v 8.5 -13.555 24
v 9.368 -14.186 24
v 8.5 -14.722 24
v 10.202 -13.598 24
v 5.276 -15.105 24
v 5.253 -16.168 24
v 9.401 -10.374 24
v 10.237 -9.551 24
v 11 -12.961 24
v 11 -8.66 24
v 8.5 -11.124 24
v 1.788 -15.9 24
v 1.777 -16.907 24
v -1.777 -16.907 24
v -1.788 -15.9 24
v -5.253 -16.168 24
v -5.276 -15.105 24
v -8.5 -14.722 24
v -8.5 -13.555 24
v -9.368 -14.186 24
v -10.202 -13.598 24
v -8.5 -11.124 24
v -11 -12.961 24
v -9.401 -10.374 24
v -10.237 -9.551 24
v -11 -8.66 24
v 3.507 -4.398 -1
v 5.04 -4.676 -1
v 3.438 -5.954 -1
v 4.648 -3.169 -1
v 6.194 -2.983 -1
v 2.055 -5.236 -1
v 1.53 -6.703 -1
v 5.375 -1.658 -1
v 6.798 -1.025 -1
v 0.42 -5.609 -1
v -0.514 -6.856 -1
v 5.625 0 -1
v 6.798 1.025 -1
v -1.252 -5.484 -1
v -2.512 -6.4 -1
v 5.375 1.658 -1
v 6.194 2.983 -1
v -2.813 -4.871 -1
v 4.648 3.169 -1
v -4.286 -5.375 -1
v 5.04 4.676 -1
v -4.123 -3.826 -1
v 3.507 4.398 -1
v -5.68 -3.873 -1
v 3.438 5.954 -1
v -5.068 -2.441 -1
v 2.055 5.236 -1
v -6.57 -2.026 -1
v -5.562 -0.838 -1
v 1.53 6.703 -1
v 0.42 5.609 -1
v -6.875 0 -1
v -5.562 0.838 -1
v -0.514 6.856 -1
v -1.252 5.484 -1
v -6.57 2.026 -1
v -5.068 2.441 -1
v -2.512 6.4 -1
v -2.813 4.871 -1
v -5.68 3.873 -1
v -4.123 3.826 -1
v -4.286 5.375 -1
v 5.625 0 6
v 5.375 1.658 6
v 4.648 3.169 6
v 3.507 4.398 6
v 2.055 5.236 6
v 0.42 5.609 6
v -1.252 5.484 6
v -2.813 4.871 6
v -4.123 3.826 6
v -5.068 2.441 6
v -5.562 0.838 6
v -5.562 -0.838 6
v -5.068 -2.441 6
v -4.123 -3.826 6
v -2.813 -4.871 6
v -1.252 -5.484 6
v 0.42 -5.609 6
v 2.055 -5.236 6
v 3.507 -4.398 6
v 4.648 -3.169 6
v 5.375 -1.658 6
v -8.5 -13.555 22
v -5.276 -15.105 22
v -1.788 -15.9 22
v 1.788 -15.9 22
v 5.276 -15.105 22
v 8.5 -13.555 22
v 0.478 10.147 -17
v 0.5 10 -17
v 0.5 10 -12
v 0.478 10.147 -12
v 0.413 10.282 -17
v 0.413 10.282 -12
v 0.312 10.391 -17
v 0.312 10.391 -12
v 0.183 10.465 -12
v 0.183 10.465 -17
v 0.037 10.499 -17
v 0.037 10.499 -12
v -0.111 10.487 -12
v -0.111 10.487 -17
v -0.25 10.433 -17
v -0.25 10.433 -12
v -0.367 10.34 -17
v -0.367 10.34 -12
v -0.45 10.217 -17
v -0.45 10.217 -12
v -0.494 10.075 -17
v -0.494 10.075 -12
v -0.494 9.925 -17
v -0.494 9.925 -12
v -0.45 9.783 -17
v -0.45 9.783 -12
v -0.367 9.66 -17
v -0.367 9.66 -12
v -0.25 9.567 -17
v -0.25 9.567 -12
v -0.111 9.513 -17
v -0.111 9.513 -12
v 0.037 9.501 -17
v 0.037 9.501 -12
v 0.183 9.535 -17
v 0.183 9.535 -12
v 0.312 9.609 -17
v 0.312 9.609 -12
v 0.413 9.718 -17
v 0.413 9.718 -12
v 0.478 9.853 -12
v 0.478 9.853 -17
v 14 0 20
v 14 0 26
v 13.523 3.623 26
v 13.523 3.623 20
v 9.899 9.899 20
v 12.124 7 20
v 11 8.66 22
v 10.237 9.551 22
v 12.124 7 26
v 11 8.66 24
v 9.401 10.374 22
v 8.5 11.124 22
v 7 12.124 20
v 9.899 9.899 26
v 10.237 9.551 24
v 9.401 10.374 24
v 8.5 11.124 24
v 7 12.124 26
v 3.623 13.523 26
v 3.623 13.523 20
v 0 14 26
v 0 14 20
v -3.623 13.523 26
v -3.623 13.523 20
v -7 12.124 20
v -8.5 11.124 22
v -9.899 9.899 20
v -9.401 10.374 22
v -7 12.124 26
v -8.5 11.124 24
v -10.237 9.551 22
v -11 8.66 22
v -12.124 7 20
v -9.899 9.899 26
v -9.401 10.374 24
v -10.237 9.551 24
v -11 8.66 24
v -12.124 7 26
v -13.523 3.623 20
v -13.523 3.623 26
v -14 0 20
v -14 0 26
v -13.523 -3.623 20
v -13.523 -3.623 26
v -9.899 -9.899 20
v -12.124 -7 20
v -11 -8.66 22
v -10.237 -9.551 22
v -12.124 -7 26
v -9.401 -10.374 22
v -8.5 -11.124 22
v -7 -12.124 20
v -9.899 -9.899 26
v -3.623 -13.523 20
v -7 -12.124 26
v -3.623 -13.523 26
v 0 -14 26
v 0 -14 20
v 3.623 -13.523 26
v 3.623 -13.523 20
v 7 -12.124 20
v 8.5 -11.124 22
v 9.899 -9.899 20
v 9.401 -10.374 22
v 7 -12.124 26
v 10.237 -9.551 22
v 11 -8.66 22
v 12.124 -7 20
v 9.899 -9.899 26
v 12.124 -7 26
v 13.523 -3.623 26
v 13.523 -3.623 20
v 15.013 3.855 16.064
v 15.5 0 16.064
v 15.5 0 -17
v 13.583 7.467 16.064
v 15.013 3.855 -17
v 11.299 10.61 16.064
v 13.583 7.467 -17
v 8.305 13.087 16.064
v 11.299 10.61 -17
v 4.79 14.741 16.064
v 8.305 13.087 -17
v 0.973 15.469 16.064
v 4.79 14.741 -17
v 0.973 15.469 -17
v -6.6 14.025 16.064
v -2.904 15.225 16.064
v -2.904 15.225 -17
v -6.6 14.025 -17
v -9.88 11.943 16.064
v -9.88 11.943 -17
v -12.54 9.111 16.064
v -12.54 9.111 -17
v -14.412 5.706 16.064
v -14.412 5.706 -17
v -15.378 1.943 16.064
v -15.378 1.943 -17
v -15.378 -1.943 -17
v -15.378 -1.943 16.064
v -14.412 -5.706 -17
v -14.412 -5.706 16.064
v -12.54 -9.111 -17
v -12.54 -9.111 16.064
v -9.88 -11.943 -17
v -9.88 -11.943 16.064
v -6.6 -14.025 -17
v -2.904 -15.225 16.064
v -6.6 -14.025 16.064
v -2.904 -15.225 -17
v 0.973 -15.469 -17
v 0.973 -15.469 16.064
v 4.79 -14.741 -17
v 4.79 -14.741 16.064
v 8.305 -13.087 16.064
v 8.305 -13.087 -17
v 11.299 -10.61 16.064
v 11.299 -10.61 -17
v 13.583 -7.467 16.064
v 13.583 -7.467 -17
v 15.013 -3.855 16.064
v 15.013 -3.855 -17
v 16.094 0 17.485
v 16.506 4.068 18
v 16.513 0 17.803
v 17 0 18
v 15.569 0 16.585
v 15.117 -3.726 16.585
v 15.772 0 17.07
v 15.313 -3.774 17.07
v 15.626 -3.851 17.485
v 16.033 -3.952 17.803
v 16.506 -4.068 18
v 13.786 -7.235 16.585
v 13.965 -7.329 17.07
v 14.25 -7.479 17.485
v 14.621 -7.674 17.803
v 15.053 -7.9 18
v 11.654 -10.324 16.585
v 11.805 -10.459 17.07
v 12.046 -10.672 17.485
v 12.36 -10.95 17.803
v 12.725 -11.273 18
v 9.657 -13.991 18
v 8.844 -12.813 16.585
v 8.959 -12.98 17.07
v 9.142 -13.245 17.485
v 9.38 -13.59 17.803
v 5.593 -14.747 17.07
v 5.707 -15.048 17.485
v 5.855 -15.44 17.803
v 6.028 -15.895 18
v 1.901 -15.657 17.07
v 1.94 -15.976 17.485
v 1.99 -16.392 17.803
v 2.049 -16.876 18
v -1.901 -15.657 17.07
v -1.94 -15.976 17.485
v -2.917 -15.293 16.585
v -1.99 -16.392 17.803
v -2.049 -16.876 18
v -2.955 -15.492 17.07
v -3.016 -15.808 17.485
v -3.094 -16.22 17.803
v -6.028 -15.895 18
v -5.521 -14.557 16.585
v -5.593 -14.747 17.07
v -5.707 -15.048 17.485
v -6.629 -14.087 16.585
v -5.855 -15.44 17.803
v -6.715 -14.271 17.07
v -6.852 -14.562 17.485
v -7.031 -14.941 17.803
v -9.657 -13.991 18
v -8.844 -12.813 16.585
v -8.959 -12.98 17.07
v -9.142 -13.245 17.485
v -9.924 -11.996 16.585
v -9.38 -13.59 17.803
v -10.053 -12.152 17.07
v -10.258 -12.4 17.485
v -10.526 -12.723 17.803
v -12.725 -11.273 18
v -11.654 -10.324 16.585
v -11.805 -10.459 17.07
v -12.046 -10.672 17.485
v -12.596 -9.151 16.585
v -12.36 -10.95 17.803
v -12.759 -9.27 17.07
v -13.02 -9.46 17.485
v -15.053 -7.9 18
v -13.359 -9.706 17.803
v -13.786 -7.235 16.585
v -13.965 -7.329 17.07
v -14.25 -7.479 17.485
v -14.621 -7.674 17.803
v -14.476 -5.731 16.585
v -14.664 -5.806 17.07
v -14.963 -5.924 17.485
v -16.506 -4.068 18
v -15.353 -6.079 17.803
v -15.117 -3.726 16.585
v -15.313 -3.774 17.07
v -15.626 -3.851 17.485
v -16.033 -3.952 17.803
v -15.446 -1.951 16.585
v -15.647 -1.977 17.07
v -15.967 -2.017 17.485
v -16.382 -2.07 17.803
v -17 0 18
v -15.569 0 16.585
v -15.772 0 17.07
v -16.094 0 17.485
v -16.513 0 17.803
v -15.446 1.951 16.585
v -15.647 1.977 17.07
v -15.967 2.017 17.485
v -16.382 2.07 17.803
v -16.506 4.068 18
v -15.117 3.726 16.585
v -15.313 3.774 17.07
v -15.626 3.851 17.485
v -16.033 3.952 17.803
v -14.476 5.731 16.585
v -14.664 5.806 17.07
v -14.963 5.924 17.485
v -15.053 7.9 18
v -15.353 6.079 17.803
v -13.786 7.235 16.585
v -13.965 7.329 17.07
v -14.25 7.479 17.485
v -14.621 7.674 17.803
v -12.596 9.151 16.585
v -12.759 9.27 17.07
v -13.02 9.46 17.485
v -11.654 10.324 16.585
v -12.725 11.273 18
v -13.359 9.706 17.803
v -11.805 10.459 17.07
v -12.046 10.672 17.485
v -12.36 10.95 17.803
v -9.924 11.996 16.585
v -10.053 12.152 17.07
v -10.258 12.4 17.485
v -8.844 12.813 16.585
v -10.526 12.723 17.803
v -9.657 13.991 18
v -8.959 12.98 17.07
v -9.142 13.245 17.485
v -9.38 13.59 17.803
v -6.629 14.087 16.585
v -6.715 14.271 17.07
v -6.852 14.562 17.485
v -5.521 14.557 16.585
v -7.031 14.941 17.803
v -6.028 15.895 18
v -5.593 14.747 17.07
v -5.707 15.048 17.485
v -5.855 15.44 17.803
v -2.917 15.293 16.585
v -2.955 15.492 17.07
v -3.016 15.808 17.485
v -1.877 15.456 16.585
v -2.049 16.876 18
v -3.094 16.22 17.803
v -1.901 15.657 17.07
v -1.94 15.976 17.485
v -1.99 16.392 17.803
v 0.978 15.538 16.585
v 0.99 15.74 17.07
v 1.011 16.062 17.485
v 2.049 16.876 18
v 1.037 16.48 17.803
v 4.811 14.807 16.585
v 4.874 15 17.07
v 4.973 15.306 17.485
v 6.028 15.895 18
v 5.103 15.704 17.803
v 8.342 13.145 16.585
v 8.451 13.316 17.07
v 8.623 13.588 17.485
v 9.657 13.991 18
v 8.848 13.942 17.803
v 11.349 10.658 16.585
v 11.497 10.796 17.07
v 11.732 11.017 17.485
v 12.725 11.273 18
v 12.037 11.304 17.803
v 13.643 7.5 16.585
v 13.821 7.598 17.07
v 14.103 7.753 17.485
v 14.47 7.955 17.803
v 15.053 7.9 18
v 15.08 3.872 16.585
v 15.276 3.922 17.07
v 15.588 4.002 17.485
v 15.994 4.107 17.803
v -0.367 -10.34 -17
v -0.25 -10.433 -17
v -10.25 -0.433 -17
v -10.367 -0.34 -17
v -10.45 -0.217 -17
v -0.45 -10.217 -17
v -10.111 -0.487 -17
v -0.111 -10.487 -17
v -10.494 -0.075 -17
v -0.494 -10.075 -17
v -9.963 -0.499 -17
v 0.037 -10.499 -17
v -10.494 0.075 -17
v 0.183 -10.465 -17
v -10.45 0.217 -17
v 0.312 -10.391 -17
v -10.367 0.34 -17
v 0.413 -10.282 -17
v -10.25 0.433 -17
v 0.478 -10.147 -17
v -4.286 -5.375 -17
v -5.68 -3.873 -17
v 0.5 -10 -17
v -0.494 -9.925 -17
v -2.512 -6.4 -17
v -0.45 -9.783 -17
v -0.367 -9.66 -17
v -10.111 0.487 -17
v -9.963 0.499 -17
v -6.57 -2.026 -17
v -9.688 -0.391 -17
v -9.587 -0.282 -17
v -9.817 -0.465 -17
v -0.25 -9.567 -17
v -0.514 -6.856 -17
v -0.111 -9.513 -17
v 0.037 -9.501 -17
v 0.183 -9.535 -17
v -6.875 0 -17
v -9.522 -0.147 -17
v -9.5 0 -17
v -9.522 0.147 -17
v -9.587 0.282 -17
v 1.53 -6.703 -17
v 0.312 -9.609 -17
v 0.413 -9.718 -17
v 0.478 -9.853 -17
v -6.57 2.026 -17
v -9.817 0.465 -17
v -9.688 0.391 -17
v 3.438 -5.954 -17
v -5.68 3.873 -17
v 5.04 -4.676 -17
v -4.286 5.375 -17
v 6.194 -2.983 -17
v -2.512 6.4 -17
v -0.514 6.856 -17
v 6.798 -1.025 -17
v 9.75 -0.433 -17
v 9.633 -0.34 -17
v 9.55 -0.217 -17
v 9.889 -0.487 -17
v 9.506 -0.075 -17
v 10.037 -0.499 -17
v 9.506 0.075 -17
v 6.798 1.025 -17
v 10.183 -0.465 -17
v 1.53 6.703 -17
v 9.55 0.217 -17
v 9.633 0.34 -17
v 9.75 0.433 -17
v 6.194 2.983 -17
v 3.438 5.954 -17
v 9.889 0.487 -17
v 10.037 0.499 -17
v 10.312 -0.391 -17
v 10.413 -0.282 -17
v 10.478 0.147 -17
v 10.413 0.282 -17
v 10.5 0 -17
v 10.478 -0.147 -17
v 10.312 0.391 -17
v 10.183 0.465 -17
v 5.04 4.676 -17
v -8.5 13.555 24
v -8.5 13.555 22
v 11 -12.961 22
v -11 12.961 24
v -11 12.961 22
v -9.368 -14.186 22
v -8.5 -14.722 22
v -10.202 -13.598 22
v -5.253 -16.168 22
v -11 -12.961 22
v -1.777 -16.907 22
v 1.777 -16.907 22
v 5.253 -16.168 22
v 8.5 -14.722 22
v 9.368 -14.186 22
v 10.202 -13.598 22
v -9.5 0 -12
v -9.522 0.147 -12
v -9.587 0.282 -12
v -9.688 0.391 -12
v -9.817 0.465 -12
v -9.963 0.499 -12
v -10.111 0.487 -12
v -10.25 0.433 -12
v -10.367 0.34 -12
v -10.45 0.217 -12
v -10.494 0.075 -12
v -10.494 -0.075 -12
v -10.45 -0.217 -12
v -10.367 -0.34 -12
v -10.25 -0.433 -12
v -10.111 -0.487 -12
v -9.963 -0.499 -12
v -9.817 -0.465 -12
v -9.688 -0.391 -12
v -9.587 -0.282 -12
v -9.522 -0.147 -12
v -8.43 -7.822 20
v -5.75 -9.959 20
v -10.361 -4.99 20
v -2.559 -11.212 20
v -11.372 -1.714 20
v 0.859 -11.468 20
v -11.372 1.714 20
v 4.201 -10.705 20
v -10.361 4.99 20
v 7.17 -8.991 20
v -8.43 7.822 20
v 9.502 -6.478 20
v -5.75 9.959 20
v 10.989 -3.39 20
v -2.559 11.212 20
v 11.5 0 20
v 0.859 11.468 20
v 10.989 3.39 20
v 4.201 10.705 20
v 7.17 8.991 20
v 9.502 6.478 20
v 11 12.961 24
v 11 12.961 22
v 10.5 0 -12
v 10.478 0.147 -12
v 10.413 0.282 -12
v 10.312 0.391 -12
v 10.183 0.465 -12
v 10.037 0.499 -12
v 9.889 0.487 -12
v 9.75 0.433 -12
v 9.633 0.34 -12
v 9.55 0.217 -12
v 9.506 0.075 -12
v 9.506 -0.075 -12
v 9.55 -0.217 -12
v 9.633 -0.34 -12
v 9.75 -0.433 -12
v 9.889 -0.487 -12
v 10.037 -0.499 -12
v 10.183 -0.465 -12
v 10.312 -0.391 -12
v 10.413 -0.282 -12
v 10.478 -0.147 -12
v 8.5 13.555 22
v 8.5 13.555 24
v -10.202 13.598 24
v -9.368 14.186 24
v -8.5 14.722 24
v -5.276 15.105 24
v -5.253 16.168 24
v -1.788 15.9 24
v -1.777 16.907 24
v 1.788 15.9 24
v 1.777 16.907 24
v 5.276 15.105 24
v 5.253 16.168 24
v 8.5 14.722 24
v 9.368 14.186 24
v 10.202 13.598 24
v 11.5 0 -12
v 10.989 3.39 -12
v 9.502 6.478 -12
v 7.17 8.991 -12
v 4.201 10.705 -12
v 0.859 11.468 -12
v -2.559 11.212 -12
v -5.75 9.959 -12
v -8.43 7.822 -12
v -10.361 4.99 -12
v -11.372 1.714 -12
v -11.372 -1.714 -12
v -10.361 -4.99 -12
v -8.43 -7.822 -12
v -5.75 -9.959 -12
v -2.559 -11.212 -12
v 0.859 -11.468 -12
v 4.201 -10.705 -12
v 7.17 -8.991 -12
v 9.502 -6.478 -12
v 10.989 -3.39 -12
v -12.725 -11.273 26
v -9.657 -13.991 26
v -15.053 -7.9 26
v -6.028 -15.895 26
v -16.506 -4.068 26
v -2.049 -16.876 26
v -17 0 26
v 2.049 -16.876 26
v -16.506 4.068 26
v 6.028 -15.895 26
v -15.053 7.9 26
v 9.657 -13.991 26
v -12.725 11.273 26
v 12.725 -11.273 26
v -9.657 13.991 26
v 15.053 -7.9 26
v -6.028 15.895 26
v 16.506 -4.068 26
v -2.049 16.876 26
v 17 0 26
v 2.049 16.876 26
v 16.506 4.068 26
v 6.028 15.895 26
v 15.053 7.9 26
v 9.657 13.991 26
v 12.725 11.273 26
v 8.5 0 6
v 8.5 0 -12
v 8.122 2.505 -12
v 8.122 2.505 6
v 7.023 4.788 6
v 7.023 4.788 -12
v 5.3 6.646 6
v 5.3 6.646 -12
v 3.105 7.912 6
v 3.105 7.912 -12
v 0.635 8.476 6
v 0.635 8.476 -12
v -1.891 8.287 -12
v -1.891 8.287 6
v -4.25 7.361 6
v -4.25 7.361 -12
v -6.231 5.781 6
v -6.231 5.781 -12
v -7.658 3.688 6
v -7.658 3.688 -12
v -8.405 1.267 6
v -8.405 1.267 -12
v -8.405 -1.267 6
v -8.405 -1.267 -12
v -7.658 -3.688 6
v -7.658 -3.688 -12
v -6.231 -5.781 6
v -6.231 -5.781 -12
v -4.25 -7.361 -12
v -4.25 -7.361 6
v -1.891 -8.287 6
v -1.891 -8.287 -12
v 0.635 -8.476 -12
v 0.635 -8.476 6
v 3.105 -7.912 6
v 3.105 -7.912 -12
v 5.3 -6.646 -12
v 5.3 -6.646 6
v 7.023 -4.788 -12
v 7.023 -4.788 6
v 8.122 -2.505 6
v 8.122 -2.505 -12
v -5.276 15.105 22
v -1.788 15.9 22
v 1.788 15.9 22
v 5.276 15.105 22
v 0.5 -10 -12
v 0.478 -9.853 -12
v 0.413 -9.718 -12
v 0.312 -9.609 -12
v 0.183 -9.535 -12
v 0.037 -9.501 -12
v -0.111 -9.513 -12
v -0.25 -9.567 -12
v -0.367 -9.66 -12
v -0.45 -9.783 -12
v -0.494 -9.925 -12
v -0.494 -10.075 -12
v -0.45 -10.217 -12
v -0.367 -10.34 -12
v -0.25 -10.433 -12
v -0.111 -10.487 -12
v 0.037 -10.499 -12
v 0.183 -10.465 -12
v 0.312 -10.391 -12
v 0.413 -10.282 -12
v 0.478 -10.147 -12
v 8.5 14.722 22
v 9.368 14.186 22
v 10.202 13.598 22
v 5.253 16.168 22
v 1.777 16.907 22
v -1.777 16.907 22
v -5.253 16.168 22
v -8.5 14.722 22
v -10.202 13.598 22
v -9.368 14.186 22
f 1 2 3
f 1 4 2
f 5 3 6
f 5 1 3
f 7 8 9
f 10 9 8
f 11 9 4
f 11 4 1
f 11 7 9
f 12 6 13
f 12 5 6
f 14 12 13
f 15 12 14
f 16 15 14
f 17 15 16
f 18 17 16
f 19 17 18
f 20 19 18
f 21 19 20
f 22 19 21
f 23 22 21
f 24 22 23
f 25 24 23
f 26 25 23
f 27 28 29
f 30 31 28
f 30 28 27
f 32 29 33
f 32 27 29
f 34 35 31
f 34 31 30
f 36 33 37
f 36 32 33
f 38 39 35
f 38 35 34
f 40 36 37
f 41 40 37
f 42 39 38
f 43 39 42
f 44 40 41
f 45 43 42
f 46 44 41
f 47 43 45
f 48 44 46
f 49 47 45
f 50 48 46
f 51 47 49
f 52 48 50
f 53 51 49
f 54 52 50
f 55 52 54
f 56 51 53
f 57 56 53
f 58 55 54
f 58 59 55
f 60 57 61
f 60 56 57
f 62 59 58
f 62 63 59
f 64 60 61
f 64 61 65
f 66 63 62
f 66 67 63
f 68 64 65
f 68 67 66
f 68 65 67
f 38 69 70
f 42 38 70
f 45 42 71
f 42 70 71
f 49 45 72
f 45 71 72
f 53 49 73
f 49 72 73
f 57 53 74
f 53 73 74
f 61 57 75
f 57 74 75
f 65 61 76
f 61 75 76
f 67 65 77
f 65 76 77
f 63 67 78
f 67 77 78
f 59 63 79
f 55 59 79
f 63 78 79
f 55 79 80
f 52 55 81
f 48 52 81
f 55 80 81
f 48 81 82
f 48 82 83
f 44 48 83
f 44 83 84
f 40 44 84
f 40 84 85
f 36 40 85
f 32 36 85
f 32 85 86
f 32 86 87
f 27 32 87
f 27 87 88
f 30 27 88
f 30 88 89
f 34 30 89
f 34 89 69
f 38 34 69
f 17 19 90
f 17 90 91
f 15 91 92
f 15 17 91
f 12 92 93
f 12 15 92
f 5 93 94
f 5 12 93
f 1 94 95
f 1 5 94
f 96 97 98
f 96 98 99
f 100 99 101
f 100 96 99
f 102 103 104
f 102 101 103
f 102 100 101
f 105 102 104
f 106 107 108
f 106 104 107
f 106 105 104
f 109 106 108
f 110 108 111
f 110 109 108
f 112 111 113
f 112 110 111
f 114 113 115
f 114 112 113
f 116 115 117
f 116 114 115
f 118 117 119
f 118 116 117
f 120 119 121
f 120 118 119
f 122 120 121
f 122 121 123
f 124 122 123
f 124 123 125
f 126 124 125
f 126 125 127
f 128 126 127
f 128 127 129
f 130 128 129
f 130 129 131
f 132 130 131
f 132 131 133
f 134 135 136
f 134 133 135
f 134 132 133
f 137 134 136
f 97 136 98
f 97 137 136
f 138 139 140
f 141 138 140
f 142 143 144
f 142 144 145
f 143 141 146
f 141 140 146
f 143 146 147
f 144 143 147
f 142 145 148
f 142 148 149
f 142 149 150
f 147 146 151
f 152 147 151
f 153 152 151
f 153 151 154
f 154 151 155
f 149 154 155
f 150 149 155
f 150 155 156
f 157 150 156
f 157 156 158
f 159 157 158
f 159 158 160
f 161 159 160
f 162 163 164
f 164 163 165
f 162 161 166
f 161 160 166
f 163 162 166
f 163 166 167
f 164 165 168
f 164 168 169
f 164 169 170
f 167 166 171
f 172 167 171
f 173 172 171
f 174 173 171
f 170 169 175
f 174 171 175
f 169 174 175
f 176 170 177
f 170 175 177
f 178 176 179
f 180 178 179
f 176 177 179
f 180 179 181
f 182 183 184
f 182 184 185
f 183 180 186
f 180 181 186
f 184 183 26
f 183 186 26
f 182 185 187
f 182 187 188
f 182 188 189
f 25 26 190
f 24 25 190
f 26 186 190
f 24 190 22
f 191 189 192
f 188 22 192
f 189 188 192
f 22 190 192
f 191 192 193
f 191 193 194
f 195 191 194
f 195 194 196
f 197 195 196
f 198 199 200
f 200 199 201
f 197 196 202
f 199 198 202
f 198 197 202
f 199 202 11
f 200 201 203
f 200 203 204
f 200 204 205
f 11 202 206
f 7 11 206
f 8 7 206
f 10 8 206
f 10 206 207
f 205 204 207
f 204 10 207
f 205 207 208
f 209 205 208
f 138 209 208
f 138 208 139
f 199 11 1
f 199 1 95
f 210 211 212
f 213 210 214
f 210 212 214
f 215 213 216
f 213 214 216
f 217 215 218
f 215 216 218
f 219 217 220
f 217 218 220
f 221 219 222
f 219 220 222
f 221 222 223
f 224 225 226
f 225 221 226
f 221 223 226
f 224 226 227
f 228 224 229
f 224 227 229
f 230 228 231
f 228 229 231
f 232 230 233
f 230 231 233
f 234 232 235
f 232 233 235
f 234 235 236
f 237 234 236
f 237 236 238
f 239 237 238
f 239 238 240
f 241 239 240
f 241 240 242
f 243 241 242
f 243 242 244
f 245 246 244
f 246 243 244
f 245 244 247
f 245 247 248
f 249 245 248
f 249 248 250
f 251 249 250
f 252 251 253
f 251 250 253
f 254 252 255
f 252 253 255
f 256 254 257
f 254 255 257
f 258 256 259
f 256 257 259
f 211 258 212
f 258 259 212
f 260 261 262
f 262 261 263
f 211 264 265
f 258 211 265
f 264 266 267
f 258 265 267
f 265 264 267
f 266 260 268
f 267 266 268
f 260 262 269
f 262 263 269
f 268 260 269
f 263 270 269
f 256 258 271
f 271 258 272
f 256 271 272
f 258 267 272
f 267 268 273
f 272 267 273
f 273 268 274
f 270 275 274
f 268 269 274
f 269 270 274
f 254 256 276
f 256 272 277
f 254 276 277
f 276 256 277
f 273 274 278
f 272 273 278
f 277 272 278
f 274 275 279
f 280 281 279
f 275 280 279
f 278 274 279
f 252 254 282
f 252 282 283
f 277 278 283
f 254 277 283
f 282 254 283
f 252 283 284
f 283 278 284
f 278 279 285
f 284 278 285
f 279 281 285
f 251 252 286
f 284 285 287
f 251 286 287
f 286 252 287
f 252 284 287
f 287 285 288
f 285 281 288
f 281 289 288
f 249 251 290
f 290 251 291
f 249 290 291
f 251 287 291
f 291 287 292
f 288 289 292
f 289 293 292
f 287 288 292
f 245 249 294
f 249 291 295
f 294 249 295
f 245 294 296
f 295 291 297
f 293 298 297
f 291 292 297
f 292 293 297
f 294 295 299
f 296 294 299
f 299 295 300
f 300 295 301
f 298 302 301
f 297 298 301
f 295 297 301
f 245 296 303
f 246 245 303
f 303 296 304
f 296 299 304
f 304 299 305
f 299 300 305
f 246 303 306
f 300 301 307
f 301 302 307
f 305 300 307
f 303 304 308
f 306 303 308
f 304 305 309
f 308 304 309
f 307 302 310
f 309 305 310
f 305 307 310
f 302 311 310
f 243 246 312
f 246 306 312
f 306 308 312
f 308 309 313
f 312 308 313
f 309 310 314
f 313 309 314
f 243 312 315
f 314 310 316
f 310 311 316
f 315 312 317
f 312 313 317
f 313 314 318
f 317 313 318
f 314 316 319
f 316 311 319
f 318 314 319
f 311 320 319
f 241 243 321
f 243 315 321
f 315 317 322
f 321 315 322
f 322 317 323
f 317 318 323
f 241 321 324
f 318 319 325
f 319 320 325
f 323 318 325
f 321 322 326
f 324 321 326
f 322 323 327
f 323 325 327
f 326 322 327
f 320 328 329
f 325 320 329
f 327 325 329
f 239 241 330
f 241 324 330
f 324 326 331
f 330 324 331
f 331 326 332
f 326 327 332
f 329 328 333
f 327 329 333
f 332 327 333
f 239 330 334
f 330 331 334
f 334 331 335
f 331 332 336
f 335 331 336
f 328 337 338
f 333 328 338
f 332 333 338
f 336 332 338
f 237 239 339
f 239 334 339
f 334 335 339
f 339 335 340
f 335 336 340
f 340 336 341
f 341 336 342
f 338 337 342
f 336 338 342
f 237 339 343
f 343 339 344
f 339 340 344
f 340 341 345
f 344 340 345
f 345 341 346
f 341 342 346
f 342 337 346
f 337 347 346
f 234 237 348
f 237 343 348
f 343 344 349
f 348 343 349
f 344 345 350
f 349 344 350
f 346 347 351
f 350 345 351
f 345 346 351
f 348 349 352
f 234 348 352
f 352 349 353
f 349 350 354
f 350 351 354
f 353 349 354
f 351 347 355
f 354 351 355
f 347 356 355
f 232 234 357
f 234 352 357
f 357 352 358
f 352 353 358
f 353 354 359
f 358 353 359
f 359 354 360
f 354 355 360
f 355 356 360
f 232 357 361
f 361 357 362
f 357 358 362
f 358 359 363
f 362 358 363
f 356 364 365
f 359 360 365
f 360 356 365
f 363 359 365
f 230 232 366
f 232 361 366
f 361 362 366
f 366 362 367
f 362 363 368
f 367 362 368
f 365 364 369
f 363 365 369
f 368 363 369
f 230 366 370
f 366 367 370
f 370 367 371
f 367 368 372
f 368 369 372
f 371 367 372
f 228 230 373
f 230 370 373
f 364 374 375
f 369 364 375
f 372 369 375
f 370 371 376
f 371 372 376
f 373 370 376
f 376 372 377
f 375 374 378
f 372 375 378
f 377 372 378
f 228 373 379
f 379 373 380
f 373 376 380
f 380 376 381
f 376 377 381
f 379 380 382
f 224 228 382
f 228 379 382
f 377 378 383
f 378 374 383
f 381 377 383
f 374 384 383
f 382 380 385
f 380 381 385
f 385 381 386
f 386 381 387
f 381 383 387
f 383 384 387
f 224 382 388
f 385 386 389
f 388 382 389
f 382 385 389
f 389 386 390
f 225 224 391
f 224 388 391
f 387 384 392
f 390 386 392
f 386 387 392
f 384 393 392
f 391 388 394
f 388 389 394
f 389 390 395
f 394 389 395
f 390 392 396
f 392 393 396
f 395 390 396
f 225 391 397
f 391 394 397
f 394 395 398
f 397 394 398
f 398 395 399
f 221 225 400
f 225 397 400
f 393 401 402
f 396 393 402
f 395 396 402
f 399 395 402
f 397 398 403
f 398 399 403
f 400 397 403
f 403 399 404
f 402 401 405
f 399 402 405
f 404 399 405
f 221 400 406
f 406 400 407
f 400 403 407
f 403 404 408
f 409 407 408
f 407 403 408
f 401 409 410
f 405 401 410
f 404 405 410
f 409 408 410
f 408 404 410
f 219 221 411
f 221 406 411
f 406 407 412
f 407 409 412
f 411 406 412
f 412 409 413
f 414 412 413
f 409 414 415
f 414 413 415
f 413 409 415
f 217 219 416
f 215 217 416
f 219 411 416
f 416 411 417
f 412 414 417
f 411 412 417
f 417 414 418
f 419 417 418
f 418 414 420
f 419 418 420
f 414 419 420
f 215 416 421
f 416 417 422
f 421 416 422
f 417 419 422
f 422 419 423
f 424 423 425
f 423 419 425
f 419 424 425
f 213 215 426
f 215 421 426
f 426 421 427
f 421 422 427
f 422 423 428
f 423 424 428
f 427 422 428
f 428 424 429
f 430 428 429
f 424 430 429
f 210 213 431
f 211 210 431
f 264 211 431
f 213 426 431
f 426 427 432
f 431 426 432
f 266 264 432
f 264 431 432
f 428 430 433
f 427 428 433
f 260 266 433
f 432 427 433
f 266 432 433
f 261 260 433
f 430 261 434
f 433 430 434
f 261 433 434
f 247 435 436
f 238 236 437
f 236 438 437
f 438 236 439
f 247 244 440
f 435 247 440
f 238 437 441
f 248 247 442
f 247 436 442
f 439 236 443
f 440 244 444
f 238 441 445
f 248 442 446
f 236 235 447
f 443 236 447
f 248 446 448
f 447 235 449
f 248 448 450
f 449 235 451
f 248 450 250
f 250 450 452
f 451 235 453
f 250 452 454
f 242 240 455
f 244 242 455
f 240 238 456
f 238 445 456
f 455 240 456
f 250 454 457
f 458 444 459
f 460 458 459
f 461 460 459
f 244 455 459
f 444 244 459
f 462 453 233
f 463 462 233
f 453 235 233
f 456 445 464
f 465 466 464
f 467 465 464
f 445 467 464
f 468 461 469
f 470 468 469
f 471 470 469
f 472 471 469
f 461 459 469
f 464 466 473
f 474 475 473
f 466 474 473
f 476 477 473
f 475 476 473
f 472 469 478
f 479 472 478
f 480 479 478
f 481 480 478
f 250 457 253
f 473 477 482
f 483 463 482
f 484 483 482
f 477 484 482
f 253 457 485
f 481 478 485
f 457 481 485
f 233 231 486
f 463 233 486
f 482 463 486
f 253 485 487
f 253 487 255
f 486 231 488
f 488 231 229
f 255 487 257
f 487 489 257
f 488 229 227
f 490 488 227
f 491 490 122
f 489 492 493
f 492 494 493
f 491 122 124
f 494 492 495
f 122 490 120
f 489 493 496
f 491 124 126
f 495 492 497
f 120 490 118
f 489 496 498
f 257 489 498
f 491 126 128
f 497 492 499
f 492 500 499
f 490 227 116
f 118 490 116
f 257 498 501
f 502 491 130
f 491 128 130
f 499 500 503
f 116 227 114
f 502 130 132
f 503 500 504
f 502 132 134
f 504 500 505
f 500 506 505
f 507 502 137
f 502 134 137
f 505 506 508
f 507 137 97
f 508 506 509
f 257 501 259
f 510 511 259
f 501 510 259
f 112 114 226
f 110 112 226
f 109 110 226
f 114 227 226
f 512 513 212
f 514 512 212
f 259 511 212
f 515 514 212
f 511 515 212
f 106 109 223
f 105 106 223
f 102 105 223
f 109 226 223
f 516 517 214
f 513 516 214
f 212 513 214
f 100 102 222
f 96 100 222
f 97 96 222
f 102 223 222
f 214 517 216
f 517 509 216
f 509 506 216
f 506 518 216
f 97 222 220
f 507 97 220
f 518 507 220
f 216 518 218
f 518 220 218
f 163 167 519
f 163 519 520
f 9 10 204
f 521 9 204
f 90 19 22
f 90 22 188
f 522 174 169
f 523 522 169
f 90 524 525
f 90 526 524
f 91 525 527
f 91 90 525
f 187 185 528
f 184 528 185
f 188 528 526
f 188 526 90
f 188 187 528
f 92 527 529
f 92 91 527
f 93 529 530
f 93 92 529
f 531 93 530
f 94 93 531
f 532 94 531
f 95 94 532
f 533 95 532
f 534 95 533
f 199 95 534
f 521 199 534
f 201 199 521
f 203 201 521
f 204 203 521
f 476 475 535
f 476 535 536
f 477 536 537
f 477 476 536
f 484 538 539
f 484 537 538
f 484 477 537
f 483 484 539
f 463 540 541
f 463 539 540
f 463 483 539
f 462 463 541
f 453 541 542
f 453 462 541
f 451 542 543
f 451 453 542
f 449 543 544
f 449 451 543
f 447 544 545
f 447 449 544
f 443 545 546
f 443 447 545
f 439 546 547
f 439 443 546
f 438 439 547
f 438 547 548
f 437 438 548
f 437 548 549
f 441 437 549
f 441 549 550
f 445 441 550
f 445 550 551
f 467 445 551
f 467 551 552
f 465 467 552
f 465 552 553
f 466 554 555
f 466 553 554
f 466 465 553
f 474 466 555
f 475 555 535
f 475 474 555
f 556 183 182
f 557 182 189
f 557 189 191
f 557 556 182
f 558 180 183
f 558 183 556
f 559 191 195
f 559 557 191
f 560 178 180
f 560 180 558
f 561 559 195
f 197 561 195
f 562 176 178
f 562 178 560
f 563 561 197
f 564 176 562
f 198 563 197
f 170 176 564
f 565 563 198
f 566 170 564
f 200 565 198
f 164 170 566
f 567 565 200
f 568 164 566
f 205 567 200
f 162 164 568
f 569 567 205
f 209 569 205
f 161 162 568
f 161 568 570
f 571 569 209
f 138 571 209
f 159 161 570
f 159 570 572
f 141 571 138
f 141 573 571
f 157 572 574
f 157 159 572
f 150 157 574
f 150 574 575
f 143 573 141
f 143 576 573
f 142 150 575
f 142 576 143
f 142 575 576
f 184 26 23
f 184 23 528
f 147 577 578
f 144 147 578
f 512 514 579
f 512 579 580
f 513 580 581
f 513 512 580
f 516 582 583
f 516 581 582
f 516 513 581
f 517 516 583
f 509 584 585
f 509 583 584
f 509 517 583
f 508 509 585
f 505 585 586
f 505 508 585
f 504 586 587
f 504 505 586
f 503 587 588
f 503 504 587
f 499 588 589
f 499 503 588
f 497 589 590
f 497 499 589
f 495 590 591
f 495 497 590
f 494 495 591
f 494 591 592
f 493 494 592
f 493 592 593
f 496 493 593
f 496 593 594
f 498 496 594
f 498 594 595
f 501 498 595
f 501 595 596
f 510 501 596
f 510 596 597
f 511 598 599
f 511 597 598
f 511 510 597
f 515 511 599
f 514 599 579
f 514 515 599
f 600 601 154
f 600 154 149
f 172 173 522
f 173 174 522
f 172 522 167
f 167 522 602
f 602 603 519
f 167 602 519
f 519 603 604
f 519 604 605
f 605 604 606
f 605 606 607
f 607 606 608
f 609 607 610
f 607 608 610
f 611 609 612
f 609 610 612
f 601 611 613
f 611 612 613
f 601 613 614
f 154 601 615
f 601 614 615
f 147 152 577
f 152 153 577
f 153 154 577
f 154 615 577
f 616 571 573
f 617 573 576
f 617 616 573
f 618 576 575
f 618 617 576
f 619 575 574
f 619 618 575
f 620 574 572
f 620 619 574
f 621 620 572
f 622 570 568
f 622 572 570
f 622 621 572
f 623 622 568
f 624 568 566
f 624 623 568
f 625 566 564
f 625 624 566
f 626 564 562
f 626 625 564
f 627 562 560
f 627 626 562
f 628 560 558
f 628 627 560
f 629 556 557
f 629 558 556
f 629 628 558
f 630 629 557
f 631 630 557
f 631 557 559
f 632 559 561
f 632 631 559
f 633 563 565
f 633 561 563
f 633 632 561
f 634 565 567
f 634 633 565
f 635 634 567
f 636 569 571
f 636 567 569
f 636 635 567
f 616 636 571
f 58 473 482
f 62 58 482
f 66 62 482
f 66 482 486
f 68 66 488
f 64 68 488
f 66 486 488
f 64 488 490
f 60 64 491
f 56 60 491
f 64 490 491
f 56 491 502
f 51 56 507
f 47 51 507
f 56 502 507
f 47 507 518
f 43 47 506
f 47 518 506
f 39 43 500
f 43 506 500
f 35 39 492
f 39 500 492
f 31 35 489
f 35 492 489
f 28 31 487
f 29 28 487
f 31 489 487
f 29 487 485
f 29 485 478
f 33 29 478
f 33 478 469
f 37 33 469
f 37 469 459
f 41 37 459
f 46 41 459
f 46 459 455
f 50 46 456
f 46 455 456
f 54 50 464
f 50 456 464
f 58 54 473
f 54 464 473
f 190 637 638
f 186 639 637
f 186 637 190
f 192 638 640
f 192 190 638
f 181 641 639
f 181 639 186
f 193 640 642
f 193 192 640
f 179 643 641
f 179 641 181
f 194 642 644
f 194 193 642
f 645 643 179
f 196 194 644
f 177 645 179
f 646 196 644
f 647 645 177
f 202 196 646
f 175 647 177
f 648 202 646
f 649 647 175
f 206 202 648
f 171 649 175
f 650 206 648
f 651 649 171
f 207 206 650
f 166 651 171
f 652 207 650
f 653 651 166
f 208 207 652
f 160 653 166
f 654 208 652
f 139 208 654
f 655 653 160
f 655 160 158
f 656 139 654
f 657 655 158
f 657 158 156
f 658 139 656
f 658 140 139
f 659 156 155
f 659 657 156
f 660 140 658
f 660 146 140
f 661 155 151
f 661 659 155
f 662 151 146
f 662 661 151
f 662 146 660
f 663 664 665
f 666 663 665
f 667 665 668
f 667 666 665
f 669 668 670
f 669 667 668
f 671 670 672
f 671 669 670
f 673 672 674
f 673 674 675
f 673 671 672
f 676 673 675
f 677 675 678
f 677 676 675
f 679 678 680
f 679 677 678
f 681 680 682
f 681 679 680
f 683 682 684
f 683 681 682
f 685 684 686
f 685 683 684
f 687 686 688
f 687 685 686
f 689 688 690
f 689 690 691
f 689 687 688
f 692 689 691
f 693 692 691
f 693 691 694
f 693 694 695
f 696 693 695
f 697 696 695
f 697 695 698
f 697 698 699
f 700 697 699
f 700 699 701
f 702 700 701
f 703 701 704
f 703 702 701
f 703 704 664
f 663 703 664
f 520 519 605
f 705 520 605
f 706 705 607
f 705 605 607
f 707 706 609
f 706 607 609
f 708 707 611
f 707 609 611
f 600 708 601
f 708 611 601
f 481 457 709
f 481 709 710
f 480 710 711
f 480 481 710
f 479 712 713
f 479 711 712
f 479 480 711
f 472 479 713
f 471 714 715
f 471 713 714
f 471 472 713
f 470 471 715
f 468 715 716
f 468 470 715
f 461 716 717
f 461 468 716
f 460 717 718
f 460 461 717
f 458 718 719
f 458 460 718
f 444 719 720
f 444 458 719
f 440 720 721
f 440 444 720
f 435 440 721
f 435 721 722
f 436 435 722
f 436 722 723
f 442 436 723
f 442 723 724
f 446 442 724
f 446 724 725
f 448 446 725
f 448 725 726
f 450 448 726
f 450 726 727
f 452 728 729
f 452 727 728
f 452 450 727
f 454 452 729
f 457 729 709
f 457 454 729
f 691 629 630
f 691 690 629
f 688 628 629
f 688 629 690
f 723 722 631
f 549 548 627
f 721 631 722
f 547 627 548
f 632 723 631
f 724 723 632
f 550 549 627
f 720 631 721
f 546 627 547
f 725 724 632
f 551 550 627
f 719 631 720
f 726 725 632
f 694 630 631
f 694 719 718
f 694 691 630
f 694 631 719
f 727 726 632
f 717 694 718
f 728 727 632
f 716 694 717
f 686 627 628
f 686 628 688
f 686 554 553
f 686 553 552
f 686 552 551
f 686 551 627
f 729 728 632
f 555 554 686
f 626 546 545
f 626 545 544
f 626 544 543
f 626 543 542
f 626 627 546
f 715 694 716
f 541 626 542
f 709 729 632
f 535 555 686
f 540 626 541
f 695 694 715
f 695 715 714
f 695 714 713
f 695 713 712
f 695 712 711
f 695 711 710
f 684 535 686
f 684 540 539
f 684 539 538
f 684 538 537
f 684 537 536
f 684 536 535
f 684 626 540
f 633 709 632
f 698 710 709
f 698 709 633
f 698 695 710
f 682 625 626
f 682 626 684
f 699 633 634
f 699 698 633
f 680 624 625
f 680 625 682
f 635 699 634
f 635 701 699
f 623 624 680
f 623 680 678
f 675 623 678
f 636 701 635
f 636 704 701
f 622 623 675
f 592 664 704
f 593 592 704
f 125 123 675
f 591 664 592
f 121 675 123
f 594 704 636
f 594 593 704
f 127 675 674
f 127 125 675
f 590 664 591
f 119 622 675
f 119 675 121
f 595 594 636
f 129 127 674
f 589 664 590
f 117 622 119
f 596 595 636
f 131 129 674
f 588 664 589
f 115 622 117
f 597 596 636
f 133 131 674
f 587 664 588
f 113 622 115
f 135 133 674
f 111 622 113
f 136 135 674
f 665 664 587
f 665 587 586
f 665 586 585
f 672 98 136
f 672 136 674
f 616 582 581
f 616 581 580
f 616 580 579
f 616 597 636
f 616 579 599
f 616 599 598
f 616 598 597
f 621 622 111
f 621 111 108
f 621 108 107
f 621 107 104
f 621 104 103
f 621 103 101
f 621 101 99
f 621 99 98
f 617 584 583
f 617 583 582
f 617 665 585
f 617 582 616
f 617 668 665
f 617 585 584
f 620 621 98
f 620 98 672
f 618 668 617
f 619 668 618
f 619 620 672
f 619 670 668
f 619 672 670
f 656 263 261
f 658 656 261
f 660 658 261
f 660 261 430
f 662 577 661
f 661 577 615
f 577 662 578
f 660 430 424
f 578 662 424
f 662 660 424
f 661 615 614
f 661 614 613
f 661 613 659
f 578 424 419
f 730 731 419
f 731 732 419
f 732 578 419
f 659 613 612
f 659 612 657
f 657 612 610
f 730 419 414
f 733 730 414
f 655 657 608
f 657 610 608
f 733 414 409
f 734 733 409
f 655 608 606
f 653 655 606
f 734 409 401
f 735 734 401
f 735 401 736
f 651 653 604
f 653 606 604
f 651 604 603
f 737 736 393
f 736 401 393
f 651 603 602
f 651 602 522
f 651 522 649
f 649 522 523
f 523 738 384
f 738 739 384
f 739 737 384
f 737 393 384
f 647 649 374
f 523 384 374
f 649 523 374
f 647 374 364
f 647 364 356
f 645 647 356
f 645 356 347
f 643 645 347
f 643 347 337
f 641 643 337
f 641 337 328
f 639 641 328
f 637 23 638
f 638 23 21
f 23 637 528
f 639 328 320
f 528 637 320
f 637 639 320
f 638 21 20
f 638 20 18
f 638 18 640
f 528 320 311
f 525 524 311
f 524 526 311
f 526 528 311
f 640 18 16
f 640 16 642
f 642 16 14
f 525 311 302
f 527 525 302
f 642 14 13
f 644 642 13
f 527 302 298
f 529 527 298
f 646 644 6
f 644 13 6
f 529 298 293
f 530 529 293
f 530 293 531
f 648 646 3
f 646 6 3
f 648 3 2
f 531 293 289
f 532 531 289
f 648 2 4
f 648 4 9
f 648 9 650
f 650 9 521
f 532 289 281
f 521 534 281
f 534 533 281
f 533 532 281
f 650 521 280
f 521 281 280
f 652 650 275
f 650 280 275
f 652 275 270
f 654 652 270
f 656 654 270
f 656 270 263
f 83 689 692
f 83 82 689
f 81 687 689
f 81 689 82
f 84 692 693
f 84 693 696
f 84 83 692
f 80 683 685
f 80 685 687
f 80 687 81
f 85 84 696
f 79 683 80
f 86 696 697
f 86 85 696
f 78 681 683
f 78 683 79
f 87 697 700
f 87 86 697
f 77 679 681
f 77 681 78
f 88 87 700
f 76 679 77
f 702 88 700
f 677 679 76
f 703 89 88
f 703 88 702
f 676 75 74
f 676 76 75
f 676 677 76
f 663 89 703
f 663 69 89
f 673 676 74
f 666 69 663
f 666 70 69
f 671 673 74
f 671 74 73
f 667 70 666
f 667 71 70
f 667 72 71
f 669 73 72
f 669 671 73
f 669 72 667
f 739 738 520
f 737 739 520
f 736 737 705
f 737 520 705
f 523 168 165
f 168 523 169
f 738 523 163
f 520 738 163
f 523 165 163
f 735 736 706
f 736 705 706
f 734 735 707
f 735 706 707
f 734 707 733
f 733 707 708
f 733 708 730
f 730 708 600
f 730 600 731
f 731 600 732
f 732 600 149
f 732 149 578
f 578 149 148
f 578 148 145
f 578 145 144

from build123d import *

# Parameters (mm, degrees)
BOSS_EXTRUDE5_DEPTH      = 26
BOSS_EXTRUDE5_DEPTH_BACK = 17
SKETCH1_R                = 15.5
SKETCH3_R                = 5.625
CUT_EXTRUDE2_DEPTH       = 49.264894074
CUT_EXTRUDE3_DEPTH       = 28
CUT_EXTRUDE3_DEPTH_BACK  = 20
SKETCH4_R                = 11.5
CUT_EXTRUDE6_START       = 6
SKETCH7_R                = 11.5
SKETCH7_R_2              = 8.5
CUT_EXTRUDE6_DEPTH       = 18
BOSS_EXTRUDE8_DEPTH      = 6
BOSS_EXTRUDE8_DEPTH_BACK = 2
BOSS_EXTRUDE8_START      = 20
SKETCH12_R               = 17
CUT_EXTRUDE10_START      = 18
SKETCH13_R               = 11.5
CUT_EXTRUDE10_DEPTH      = 18.411862419
FILLET2_R                = 2
CUT_EXTRUDE11_START      = 26
SKETCH14_R               = 14
CUT_EXTRUDE11_DEPTH      = 6
CUT_EXTRUDE14_DEPTH      = 36.411862419
CUT_EXTRUDE14_DEPTH_BACK = 36.411862419
SKETCH15_R               = 0.5
SKETCH18_W               = 2.5
SKETCH18_H               = 2
CUT_EXTRUDE15_DEPTH      = 20
CUT_EXTRUDE16_DEPTH      = 2
SKETCH28_R               = 6.875
CUT_EXTRUDE17_DEPTH      = 16


with BuildPart() as part:
    # Sketch1 → Boss-Extrude5 (new, two sides: drawn at the far end of the back side and taken through both)
    with BuildSketch(Plane.XY.offset(-BOSS_EXTRUDE5_DEPTH_BACK)):
        Circle(SKETCH1_R)
    extrude(amount=BOSS_EXTRUDE5_DEPTH + BOSS_EXTRUDE5_DEPTH_BACK)

    # Sketch3 → Cut-Extrude2 (cut, through all)
    with BuildSketch(Plane.XY.offset(26)):
        Circle(SKETCH3_R)
    extrude(amount=-CUT_EXTRUDE2_DEPTH, mode=Mode.SUBTRACT)

    # Sketch4 → Cut-Extrude3 (cut, two sides: drawn at the far end of the back side and taken through both)
    with BuildSketch(Plane.XY.offset(26).offset(-CUT_EXTRUDE3_DEPTH_BACK)):
        Circle(SKETCH4_R)
    extrude(amount=CUT_EXTRUDE3_DEPTH + CUT_EXTRUDE3_DEPTH_BACK, mode=Mode.SUBTRACT)

    # Sketch7 → Cut-Extrude6 (cut)
    with BuildSketch(Plane.XY.offset(CUT_EXTRUDE6_START)):
        Circle(SKETCH7_R)
        Circle(SKETCH7_R_2, mode=Mode.SUBTRACT)
    extrude(amount=-CUT_EXTRUDE6_DEPTH, mode=Mode.SUBTRACT)

    # Sketch12 → Boss-Extrude8 (add, two sides: drawn at the far end of the back side and taken through both)
    with BuildSketch(Plane.XY.offset(BOSS_EXTRUDE8_START - BOSS_EXTRUDE8_DEPTH_BACK)):
        Circle(SKETCH12_R)
    extrude(amount=BOSS_EXTRUDE8_DEPTH + BOSS_EXTRUDE8_DEPTH_BACK)

    # Sketch13 → Cut-Extrude10 (cut, through all)
    with BuildSketch(Plane.XY.offset(CUT_EXTRUDE10_START)):
        Circle(SKETCH13_R)
    extrude(amount=CUT_EXTRUDE10_DEPTH, mode=Mode.SUBTRACT)

    # Fillet2
    # the kernel refuses this fillet: 2 mm, written as the material it adds along each edge
    with BuildSketch(Plane(origin=(0, 0, 18), x_dir=(1, 0, 0), z_dir=(0, 1, 0))) as fillet2_piece_1:
        with BuildLine():
            CenterArc((17.5, 1.936491673), FILLET2_R, 180, 75.522487814)
            Line((17, 0), (16.99, -0.038729833))
            ThreePointArc((16.99, -0.038729833), (16.25, -0.04), (15.5, -0.04))
            Line((15.5, -0.04), (15.46, 0))
            Line((15.46, 0), (15.46, 1.936491673))
            Line((15.46, 1.936491673), (15.5, 1.936491673))
        make_face()
    revolve(axis=Axis((0, 0, 18), (0, 0, -1)))

    # Sketch14 → Cut-Extrude11 (cut)
    with BuildSketch(Plane.XY.offset(CUT_EXTRUDE11_START)):
        Circle(SKETCH14_R)
    extrude(amount=-CUT_EXTRUDE11_DEPTH, mode=Mode.SUBTRACT)

    # Sketch15 → Cut-Extrude14 (cut, two sides: drawn at the far end of the back side and taken through both)
    with BuildSketch(Plane.XY.offset(-CUT_EXTRUDE14_DEPTH_BACK)):
        with Locations((0, 10)):
            Circle(SKETCH15_R)
        with Locations((0, -10)):
            Circle(SKETCH15_R)
        with Locations((10, 0)):
            Circle(SKETCH15_R)
        with Locations((-10, 0)):
            Circle(SKETCH15_R)
    extrude(amount=CUT_EXTRUDE14_DEPTH + CUT_EXTRUDE14_DEPTH_BACK, mode=Mode.SUBTRACT)

    # Sketch18 → Cut-Extrude15 (cut, symmetric)
    with BuildSketch(Plane(origin=(0, 0, 0), x_dir=(1, 0, 0), z_dir=(0, 1, 0))):
        with Locations((-9.75, -23)):
            Rectangle(SKETCH18_W, SKETCH18_H)
        with Locations((9.75, -23)):
            Rectangle(SKETCH18_W, SKETCH18_H)
    extrude(amount=CUT_EXTRUDE15_DEPTH, both=True, mode=Mode.SUBTRACT)

    # Sketch23 → Cut-Extrude16 (cut)
    with BuildSketch(Plane(origin=(0, 0, 24), x_dir=(-1, 0, 0), z_dir=(0, 0, -1))):
        with BuildLine():
            Line((9.719197711, 13.947659153), (9.147480199, 13.127208615))
            ThreePointArc((9.147480199, 13.127208615), (0, 16), (-9.147480199, 13.127208615))
            Line((-9.147480199, 13.127208615), (-9.719197711, 13.947659153))
            ThreePointArc((-9.719197711, 13.947659153), (0, 17), (9.719197711, 13.947659153))
        make_face()
        with BuildLine():
            Line((-9.147480199, -13.127208615), (-9.719197711, -13.947659153))
            ThreePointArc((-9.719197711, -13.947659153), (0, -17), (9.719197711, -13.947659153))
            Line((9.719197711, -13.947659153), (9.147480199, -13.127208615))
            ThreePointArc((9.147480199, -13.127208615), (0, -16), (-9.147480199, -13.127208615))
        make_face()
    extrude(amount=CUT_EXTRUDE16_DEPTH, mode=Mode.SUBTRACT)

    # Sketch28 → Cut-Extrude17 (cut)
    with BuildSketch(Plane(origin=(0, 0, -17), x_dir=(-1, 0, 0), z_dir=(0, 0, -1))):
        Circle(SKETCH28_R)
    extrude(amount=-CUT_EXTRUDE17_DEPTH, mode=Mode.SUBTRACT)


solid = part.part
